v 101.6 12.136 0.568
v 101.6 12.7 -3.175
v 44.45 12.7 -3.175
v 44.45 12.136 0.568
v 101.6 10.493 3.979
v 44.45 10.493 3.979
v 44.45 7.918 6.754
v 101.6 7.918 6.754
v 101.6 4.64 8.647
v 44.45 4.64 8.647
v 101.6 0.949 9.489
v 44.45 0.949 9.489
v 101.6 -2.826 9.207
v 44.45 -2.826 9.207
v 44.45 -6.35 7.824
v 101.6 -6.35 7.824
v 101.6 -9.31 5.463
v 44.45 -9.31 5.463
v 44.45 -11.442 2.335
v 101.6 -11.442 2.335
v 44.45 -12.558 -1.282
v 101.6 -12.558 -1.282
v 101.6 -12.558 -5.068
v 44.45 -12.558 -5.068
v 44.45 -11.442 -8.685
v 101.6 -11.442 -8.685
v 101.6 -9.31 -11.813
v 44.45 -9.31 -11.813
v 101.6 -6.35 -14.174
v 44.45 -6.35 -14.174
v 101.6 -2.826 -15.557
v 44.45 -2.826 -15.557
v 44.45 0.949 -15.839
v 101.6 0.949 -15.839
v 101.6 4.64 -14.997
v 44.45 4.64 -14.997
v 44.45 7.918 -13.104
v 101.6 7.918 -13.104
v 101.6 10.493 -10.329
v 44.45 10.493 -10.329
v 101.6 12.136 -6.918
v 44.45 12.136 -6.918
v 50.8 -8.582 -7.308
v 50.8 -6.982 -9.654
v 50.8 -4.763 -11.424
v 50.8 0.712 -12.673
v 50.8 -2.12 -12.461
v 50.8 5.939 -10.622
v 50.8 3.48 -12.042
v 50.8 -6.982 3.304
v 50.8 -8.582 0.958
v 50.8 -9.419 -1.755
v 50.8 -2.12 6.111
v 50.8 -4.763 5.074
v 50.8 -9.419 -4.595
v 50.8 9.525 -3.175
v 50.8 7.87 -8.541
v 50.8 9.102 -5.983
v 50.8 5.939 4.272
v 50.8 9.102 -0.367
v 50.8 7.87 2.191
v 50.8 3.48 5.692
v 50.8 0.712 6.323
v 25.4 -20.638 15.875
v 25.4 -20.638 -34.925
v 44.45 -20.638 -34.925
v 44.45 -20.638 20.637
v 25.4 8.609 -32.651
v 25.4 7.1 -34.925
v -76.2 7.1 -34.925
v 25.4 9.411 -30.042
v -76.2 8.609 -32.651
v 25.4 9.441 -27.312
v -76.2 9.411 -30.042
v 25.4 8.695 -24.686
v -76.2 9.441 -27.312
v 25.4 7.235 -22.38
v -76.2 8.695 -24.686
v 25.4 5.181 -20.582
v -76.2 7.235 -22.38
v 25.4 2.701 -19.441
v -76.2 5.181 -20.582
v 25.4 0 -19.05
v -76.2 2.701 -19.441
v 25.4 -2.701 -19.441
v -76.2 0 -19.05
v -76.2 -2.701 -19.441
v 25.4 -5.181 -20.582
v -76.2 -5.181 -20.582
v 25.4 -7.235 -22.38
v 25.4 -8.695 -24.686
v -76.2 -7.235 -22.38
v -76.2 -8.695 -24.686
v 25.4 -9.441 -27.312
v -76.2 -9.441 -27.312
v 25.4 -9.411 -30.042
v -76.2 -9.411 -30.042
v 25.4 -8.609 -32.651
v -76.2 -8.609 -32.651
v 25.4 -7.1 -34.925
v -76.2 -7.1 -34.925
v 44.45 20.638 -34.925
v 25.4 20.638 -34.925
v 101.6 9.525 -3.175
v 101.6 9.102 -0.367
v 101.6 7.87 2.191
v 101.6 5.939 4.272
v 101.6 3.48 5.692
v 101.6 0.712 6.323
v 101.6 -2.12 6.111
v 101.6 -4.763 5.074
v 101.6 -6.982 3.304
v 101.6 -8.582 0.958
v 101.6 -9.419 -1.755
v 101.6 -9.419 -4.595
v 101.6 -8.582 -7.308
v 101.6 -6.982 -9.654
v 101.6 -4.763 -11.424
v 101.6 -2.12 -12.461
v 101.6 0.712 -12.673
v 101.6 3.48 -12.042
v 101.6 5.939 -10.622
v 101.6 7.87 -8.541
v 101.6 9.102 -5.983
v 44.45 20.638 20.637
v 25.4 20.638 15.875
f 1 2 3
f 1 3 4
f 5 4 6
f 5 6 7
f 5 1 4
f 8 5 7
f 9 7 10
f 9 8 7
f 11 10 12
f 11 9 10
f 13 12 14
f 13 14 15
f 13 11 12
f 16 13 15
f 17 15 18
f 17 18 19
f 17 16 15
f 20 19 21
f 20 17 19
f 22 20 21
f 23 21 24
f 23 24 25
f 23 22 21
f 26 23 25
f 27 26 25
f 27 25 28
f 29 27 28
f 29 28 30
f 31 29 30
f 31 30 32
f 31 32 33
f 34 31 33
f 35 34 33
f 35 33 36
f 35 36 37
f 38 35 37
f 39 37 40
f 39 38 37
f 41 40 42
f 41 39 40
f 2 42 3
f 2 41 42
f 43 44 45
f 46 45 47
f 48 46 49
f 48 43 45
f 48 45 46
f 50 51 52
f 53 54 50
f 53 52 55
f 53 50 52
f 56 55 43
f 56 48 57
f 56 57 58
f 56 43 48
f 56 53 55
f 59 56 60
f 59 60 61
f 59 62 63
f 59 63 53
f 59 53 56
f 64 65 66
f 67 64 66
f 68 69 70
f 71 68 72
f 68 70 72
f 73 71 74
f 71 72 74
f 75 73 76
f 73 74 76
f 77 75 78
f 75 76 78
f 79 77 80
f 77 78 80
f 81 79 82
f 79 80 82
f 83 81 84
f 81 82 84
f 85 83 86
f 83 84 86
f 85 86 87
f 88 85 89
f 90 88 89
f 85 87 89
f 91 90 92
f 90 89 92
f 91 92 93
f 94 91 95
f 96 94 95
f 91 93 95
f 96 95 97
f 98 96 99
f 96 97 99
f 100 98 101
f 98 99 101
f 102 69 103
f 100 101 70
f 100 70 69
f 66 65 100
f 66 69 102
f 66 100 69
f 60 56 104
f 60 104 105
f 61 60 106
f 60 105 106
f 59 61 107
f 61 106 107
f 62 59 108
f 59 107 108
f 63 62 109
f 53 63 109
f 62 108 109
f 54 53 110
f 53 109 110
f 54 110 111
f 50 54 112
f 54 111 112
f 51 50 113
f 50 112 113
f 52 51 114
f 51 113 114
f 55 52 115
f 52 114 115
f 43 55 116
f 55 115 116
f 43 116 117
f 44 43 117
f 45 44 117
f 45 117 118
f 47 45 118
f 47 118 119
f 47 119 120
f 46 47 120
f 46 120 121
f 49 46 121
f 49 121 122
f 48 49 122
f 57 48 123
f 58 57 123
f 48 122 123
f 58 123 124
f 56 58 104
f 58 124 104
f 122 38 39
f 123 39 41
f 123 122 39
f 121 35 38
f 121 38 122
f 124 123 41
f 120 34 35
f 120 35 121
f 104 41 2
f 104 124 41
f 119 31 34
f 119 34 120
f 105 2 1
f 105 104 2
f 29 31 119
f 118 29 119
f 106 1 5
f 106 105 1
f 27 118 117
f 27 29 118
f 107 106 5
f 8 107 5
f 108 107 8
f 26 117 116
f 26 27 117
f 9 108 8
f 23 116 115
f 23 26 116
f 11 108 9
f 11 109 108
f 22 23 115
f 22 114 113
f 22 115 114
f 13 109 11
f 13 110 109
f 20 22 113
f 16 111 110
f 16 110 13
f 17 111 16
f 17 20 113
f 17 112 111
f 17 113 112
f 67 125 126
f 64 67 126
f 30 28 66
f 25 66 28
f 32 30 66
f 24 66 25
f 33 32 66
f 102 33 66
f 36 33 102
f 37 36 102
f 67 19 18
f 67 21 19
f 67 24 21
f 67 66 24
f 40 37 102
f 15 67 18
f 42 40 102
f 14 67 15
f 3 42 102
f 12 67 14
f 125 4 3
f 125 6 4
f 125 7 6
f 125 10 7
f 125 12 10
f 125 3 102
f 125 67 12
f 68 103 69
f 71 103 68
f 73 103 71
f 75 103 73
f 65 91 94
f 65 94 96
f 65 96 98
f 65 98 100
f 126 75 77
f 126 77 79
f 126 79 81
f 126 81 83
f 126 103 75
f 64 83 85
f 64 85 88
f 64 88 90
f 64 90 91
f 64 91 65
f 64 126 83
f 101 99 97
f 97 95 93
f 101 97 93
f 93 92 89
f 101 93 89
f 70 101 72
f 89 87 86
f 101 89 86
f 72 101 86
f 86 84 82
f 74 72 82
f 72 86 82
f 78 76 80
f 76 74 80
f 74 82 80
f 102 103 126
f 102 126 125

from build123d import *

# Parameters (mm, degrees)
F1_DEPTH  = 20.6375
F2_R      = 9.525
F3_DEPTH  = 50.8
F5_DEPTH  = 127
F7_DEPTH  = 41.276
F8_W      = 41.275
F8_H      = 69.85
F8_R      = 12.7
F9_DEPTH  = 57.15
F10_W     = 25.4
F10_H     = 32.7966427431
F11_DEPTH = 34.926


# Not quite as in the source:
# - a feature names something its author has since deleted; it is built from what else it names


with BuildPart() as f1:
    # F0 (on Front) → F1 (new body, symmetric)
    with BuildSketch(Plane.XZ):
        Polygon((-101.6, -34.925), (101.6, -34.925), (101.6, 34.925), (-101.6, -15.875), align=None)
    extrude(amount=F1_DEPTH, both=True)

    # F2 (on face) → F3 (cut)
    with BuildSketch(Plane.YZ.offset(101.6)):
        with Locations((0, -3.175)):
            Circle(F2_R)
    extrude(amount=-F3_DEPTH, mode=Mode.SUBTRACT)

    # F4 (on face) → F5 (cut)
    with BuildSketch(Plane(origin=(-101.6, 0, 0), x_dir=(0, -1, 0), z_dir=(-1, 0, 0))):
        with BuildLine():
            ThreePointArc((-7.0995158286, -34.925), (0, -19.05), (7.0995158286, -34.925))
            Line((7.0995158286, -34.925), (20.6375, -34.925))
            Line((20.6375, -34.925), (20.6375, -15.875))
            Line((20.6375, -15.875), (-20.6375, -15.875))
            Line((-20.6375, -15.875), (-20.6375, -34.925))
            Line((-20.6375, -34.925), (-7.0995158286, -34.925))
        make_face()
    extrude(amount=-F5_DEPTH, mode=Mode.SUBTRACT)

    # F6 (on face) → F7 (cut, through all)
    with BuildSketch(Plane(origin=(0, 20.6375, 0), x_dir=(-1, 0, 0), z_dir=(0, 1, 0))):
        Polygon((-25.4, 15.875), (-25.4, -15.875), (101.6, -15.875), align=None)
    extrude(amount=-F7_DEPTH, mode=Mode.SUBTRACT)

    # F8 (on face) → F9 (cut)
    with BuildSketch(Plane.YZ.offset(101.6)):
        Rectangle(F8_W, F8_H)
        with Locations((0, -3.175)):
            Circle(F8_R, mode=Mode.SUBTRACT)
    extrude(amount=-F9_DEPTH, mode=Mode.SUBTRACT)

    # F10 (on Top) → F11 (cut, through all)
    with BuildSketch(Plane.XY):
        with Locations((-88.9, -1.6974383034)):
            Rectangle(F10_W, F10_H)
    extrude(amount=-F11_DEPTH, mode=Mode.SUBTRACT)


solid = f1.part
